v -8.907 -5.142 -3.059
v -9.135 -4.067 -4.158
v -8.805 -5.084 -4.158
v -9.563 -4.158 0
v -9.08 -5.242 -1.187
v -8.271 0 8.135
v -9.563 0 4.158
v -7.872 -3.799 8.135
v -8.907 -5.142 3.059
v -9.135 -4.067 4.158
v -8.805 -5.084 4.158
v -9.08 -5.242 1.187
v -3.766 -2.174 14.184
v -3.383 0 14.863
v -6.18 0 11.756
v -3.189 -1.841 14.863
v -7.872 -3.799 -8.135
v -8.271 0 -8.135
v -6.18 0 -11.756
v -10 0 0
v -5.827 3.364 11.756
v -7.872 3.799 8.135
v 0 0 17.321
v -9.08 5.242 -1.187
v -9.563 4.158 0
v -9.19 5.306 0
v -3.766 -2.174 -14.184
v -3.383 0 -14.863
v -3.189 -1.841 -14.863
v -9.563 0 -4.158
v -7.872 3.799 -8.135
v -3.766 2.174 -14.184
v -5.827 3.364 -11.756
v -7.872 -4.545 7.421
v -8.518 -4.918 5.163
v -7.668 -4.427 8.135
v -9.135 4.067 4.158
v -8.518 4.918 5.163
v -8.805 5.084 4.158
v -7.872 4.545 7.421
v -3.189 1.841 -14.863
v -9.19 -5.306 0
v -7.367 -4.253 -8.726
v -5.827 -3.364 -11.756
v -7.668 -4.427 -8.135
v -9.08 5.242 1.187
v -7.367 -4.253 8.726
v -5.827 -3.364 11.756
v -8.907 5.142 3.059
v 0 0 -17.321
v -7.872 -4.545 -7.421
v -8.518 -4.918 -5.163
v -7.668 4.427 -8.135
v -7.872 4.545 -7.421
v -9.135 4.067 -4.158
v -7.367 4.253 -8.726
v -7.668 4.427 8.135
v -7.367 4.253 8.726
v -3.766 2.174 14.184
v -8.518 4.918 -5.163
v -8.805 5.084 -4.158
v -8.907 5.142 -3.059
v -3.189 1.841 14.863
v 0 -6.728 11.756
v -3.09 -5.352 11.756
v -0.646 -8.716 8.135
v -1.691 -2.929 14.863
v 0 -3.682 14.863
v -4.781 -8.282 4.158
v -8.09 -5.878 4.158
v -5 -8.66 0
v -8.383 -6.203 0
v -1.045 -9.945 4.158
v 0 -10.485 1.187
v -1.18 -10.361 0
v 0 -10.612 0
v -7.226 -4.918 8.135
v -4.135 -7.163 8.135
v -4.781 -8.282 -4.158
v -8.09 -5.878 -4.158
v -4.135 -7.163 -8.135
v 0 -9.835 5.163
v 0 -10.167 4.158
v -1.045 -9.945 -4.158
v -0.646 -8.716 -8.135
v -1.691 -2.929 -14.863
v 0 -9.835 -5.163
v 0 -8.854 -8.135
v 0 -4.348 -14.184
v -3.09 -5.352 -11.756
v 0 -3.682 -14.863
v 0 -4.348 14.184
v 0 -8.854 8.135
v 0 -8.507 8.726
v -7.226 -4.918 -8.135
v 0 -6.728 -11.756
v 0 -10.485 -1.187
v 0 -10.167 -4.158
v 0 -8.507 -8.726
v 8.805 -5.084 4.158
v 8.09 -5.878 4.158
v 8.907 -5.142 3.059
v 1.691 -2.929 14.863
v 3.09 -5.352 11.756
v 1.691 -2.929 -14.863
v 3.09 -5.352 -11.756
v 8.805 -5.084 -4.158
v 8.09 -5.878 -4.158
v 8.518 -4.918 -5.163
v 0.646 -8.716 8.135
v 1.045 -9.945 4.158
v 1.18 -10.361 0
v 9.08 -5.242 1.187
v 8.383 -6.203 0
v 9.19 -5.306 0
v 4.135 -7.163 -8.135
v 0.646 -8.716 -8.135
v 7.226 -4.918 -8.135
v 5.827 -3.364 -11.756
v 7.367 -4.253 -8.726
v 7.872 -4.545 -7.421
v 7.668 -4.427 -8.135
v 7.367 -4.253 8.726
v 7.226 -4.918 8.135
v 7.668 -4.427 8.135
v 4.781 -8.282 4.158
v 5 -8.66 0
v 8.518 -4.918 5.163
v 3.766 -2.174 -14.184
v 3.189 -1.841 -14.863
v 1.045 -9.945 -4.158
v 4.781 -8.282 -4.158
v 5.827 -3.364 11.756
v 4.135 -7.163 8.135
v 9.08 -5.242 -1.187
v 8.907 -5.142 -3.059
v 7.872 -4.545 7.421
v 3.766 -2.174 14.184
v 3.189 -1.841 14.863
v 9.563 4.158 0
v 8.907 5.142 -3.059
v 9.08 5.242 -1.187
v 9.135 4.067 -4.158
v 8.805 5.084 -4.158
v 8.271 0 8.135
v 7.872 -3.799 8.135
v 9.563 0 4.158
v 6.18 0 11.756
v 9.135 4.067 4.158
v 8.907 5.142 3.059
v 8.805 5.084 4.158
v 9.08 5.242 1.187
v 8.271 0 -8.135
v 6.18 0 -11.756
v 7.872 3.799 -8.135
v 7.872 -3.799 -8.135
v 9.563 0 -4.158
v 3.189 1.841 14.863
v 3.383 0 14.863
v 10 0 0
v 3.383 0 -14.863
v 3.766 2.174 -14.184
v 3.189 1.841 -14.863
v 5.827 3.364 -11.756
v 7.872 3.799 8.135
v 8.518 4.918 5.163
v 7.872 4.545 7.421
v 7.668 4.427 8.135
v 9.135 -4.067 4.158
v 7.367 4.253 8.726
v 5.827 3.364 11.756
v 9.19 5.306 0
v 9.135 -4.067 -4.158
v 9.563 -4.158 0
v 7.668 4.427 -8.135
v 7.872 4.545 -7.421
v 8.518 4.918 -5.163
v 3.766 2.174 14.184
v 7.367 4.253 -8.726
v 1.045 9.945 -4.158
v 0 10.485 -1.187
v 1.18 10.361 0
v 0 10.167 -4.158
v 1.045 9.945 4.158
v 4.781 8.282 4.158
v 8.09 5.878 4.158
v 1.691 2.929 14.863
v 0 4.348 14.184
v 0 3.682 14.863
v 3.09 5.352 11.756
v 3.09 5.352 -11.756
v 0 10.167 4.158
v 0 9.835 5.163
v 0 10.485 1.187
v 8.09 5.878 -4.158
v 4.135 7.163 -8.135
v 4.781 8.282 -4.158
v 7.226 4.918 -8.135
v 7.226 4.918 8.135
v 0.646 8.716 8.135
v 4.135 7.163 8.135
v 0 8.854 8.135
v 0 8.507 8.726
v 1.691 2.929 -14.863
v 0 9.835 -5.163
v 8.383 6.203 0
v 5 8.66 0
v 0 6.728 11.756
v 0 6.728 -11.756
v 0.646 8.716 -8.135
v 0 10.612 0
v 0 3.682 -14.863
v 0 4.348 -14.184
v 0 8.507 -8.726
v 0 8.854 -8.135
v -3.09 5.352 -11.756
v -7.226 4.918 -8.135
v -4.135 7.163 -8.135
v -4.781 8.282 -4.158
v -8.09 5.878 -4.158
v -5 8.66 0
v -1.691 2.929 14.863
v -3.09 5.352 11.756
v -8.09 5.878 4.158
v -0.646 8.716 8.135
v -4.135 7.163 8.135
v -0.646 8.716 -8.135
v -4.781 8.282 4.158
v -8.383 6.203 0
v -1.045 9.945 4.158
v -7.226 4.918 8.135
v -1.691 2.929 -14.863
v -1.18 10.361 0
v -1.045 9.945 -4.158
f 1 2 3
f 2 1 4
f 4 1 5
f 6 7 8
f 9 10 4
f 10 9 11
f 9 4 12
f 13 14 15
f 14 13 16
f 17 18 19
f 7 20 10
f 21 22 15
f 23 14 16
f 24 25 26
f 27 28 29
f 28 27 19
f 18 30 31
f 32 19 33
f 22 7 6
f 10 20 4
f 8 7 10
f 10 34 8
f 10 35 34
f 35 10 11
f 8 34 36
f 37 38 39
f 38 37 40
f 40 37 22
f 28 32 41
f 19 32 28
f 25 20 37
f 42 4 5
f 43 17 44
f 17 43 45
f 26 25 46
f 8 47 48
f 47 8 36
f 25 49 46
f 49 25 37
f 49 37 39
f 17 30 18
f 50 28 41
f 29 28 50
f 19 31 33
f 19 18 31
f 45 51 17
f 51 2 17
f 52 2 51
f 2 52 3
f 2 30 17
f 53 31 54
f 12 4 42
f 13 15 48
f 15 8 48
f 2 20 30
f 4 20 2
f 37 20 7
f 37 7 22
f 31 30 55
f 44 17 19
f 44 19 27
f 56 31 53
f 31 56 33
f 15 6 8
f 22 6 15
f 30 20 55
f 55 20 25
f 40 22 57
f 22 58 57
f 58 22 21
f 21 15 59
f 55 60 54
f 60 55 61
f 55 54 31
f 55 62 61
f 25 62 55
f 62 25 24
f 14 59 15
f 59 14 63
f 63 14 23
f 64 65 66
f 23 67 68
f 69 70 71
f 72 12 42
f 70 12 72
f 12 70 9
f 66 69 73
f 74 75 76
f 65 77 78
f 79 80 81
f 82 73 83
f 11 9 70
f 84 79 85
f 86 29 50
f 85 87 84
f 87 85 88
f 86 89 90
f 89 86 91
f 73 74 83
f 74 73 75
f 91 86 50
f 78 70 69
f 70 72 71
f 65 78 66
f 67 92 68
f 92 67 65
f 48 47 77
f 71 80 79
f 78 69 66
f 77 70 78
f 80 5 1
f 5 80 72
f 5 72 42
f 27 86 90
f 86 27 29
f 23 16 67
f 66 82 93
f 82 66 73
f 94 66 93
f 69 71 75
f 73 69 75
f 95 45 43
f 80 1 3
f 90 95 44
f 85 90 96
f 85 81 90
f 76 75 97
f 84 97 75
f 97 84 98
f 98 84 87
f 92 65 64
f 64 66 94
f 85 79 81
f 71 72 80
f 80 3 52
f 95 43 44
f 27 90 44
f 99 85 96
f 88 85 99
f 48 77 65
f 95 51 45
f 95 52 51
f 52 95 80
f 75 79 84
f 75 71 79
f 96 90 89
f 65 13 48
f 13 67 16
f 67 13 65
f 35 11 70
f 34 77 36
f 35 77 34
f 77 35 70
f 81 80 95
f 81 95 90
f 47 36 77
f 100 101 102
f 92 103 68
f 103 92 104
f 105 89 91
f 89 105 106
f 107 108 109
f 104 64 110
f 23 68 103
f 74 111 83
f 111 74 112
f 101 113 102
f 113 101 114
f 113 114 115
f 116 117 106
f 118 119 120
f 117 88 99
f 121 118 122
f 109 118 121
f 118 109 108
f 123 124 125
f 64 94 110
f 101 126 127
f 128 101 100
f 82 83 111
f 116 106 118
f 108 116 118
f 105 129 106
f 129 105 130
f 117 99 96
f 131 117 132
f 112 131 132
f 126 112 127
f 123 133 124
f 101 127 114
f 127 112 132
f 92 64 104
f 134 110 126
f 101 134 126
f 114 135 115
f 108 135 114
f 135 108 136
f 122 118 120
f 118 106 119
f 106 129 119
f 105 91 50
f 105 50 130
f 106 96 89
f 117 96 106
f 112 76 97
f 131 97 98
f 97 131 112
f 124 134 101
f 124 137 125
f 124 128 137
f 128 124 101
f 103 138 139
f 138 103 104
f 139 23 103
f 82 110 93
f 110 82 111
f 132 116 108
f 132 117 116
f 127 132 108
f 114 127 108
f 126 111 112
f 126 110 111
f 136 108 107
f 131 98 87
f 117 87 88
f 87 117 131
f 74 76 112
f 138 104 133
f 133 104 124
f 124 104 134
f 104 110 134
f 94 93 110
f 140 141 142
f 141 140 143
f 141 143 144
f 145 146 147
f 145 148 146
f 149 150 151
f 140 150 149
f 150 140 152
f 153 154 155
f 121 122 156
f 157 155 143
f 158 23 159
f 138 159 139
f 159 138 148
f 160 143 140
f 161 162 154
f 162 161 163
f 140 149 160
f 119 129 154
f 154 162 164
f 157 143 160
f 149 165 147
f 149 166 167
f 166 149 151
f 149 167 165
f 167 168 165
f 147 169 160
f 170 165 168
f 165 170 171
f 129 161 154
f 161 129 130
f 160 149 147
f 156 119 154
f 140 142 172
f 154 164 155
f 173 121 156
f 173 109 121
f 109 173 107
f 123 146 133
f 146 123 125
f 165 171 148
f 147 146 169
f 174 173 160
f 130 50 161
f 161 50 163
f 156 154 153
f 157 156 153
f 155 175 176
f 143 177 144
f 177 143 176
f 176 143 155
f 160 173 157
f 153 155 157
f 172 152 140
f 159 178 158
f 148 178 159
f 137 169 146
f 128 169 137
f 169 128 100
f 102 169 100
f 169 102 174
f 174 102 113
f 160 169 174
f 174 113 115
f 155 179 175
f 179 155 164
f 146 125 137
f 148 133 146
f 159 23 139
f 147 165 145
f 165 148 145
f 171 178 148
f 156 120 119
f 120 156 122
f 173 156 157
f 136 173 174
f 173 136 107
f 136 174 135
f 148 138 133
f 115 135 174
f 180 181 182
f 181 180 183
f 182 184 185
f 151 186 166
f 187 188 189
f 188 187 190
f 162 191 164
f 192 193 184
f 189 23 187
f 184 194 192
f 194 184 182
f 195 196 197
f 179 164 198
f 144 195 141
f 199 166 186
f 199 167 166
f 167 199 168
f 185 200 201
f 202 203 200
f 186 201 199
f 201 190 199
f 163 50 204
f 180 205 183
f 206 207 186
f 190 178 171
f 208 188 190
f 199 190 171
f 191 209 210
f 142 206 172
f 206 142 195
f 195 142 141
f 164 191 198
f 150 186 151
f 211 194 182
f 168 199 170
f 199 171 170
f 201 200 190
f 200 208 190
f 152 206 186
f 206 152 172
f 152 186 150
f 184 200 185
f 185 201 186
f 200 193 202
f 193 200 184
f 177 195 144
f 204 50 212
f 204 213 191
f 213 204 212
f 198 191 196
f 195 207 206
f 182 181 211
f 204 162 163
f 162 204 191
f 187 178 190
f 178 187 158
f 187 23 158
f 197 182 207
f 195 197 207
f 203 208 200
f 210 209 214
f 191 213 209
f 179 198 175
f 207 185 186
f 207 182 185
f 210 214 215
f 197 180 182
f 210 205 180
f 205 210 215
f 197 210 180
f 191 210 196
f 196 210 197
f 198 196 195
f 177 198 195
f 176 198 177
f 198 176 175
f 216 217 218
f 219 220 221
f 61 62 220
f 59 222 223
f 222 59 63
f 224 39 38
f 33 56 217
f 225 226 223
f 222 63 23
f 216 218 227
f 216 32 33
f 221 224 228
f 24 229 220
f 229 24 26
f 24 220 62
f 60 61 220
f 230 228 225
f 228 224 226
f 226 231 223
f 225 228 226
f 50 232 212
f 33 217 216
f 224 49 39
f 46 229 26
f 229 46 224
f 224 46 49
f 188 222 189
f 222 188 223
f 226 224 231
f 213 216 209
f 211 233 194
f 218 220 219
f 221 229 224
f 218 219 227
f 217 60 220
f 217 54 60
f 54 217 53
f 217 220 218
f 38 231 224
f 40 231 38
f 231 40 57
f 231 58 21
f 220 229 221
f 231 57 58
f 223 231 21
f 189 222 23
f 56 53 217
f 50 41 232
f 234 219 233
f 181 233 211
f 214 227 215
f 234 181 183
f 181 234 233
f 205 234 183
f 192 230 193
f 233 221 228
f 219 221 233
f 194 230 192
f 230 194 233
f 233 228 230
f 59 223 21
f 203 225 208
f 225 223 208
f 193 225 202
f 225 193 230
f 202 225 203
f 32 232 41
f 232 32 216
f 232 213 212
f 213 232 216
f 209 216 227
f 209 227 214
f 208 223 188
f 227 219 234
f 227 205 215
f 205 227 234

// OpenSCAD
//difference()
//{
//    slot(20, 100, 5);
////    slot(15, 100, 6);
//    for(x=[-50:20:50])
//        translate([x,0,0]) cylinder(d=10, h=10);
//}

//module slot(w, l, h)
//{
//    hull()
//    {
//        for(x=[-l/2,l/2])
//            translate([x,0,0])
//            cylinder(d=w,h=h);
//    }
//}

intersection_for (n=[0:60:360])
{
//    color("red")
    rotate(n)
        translate([10,0,0])
            sphere(20);
}


//translate([20,0,0])cylinder(d=10, h= 20, $fn=6);
